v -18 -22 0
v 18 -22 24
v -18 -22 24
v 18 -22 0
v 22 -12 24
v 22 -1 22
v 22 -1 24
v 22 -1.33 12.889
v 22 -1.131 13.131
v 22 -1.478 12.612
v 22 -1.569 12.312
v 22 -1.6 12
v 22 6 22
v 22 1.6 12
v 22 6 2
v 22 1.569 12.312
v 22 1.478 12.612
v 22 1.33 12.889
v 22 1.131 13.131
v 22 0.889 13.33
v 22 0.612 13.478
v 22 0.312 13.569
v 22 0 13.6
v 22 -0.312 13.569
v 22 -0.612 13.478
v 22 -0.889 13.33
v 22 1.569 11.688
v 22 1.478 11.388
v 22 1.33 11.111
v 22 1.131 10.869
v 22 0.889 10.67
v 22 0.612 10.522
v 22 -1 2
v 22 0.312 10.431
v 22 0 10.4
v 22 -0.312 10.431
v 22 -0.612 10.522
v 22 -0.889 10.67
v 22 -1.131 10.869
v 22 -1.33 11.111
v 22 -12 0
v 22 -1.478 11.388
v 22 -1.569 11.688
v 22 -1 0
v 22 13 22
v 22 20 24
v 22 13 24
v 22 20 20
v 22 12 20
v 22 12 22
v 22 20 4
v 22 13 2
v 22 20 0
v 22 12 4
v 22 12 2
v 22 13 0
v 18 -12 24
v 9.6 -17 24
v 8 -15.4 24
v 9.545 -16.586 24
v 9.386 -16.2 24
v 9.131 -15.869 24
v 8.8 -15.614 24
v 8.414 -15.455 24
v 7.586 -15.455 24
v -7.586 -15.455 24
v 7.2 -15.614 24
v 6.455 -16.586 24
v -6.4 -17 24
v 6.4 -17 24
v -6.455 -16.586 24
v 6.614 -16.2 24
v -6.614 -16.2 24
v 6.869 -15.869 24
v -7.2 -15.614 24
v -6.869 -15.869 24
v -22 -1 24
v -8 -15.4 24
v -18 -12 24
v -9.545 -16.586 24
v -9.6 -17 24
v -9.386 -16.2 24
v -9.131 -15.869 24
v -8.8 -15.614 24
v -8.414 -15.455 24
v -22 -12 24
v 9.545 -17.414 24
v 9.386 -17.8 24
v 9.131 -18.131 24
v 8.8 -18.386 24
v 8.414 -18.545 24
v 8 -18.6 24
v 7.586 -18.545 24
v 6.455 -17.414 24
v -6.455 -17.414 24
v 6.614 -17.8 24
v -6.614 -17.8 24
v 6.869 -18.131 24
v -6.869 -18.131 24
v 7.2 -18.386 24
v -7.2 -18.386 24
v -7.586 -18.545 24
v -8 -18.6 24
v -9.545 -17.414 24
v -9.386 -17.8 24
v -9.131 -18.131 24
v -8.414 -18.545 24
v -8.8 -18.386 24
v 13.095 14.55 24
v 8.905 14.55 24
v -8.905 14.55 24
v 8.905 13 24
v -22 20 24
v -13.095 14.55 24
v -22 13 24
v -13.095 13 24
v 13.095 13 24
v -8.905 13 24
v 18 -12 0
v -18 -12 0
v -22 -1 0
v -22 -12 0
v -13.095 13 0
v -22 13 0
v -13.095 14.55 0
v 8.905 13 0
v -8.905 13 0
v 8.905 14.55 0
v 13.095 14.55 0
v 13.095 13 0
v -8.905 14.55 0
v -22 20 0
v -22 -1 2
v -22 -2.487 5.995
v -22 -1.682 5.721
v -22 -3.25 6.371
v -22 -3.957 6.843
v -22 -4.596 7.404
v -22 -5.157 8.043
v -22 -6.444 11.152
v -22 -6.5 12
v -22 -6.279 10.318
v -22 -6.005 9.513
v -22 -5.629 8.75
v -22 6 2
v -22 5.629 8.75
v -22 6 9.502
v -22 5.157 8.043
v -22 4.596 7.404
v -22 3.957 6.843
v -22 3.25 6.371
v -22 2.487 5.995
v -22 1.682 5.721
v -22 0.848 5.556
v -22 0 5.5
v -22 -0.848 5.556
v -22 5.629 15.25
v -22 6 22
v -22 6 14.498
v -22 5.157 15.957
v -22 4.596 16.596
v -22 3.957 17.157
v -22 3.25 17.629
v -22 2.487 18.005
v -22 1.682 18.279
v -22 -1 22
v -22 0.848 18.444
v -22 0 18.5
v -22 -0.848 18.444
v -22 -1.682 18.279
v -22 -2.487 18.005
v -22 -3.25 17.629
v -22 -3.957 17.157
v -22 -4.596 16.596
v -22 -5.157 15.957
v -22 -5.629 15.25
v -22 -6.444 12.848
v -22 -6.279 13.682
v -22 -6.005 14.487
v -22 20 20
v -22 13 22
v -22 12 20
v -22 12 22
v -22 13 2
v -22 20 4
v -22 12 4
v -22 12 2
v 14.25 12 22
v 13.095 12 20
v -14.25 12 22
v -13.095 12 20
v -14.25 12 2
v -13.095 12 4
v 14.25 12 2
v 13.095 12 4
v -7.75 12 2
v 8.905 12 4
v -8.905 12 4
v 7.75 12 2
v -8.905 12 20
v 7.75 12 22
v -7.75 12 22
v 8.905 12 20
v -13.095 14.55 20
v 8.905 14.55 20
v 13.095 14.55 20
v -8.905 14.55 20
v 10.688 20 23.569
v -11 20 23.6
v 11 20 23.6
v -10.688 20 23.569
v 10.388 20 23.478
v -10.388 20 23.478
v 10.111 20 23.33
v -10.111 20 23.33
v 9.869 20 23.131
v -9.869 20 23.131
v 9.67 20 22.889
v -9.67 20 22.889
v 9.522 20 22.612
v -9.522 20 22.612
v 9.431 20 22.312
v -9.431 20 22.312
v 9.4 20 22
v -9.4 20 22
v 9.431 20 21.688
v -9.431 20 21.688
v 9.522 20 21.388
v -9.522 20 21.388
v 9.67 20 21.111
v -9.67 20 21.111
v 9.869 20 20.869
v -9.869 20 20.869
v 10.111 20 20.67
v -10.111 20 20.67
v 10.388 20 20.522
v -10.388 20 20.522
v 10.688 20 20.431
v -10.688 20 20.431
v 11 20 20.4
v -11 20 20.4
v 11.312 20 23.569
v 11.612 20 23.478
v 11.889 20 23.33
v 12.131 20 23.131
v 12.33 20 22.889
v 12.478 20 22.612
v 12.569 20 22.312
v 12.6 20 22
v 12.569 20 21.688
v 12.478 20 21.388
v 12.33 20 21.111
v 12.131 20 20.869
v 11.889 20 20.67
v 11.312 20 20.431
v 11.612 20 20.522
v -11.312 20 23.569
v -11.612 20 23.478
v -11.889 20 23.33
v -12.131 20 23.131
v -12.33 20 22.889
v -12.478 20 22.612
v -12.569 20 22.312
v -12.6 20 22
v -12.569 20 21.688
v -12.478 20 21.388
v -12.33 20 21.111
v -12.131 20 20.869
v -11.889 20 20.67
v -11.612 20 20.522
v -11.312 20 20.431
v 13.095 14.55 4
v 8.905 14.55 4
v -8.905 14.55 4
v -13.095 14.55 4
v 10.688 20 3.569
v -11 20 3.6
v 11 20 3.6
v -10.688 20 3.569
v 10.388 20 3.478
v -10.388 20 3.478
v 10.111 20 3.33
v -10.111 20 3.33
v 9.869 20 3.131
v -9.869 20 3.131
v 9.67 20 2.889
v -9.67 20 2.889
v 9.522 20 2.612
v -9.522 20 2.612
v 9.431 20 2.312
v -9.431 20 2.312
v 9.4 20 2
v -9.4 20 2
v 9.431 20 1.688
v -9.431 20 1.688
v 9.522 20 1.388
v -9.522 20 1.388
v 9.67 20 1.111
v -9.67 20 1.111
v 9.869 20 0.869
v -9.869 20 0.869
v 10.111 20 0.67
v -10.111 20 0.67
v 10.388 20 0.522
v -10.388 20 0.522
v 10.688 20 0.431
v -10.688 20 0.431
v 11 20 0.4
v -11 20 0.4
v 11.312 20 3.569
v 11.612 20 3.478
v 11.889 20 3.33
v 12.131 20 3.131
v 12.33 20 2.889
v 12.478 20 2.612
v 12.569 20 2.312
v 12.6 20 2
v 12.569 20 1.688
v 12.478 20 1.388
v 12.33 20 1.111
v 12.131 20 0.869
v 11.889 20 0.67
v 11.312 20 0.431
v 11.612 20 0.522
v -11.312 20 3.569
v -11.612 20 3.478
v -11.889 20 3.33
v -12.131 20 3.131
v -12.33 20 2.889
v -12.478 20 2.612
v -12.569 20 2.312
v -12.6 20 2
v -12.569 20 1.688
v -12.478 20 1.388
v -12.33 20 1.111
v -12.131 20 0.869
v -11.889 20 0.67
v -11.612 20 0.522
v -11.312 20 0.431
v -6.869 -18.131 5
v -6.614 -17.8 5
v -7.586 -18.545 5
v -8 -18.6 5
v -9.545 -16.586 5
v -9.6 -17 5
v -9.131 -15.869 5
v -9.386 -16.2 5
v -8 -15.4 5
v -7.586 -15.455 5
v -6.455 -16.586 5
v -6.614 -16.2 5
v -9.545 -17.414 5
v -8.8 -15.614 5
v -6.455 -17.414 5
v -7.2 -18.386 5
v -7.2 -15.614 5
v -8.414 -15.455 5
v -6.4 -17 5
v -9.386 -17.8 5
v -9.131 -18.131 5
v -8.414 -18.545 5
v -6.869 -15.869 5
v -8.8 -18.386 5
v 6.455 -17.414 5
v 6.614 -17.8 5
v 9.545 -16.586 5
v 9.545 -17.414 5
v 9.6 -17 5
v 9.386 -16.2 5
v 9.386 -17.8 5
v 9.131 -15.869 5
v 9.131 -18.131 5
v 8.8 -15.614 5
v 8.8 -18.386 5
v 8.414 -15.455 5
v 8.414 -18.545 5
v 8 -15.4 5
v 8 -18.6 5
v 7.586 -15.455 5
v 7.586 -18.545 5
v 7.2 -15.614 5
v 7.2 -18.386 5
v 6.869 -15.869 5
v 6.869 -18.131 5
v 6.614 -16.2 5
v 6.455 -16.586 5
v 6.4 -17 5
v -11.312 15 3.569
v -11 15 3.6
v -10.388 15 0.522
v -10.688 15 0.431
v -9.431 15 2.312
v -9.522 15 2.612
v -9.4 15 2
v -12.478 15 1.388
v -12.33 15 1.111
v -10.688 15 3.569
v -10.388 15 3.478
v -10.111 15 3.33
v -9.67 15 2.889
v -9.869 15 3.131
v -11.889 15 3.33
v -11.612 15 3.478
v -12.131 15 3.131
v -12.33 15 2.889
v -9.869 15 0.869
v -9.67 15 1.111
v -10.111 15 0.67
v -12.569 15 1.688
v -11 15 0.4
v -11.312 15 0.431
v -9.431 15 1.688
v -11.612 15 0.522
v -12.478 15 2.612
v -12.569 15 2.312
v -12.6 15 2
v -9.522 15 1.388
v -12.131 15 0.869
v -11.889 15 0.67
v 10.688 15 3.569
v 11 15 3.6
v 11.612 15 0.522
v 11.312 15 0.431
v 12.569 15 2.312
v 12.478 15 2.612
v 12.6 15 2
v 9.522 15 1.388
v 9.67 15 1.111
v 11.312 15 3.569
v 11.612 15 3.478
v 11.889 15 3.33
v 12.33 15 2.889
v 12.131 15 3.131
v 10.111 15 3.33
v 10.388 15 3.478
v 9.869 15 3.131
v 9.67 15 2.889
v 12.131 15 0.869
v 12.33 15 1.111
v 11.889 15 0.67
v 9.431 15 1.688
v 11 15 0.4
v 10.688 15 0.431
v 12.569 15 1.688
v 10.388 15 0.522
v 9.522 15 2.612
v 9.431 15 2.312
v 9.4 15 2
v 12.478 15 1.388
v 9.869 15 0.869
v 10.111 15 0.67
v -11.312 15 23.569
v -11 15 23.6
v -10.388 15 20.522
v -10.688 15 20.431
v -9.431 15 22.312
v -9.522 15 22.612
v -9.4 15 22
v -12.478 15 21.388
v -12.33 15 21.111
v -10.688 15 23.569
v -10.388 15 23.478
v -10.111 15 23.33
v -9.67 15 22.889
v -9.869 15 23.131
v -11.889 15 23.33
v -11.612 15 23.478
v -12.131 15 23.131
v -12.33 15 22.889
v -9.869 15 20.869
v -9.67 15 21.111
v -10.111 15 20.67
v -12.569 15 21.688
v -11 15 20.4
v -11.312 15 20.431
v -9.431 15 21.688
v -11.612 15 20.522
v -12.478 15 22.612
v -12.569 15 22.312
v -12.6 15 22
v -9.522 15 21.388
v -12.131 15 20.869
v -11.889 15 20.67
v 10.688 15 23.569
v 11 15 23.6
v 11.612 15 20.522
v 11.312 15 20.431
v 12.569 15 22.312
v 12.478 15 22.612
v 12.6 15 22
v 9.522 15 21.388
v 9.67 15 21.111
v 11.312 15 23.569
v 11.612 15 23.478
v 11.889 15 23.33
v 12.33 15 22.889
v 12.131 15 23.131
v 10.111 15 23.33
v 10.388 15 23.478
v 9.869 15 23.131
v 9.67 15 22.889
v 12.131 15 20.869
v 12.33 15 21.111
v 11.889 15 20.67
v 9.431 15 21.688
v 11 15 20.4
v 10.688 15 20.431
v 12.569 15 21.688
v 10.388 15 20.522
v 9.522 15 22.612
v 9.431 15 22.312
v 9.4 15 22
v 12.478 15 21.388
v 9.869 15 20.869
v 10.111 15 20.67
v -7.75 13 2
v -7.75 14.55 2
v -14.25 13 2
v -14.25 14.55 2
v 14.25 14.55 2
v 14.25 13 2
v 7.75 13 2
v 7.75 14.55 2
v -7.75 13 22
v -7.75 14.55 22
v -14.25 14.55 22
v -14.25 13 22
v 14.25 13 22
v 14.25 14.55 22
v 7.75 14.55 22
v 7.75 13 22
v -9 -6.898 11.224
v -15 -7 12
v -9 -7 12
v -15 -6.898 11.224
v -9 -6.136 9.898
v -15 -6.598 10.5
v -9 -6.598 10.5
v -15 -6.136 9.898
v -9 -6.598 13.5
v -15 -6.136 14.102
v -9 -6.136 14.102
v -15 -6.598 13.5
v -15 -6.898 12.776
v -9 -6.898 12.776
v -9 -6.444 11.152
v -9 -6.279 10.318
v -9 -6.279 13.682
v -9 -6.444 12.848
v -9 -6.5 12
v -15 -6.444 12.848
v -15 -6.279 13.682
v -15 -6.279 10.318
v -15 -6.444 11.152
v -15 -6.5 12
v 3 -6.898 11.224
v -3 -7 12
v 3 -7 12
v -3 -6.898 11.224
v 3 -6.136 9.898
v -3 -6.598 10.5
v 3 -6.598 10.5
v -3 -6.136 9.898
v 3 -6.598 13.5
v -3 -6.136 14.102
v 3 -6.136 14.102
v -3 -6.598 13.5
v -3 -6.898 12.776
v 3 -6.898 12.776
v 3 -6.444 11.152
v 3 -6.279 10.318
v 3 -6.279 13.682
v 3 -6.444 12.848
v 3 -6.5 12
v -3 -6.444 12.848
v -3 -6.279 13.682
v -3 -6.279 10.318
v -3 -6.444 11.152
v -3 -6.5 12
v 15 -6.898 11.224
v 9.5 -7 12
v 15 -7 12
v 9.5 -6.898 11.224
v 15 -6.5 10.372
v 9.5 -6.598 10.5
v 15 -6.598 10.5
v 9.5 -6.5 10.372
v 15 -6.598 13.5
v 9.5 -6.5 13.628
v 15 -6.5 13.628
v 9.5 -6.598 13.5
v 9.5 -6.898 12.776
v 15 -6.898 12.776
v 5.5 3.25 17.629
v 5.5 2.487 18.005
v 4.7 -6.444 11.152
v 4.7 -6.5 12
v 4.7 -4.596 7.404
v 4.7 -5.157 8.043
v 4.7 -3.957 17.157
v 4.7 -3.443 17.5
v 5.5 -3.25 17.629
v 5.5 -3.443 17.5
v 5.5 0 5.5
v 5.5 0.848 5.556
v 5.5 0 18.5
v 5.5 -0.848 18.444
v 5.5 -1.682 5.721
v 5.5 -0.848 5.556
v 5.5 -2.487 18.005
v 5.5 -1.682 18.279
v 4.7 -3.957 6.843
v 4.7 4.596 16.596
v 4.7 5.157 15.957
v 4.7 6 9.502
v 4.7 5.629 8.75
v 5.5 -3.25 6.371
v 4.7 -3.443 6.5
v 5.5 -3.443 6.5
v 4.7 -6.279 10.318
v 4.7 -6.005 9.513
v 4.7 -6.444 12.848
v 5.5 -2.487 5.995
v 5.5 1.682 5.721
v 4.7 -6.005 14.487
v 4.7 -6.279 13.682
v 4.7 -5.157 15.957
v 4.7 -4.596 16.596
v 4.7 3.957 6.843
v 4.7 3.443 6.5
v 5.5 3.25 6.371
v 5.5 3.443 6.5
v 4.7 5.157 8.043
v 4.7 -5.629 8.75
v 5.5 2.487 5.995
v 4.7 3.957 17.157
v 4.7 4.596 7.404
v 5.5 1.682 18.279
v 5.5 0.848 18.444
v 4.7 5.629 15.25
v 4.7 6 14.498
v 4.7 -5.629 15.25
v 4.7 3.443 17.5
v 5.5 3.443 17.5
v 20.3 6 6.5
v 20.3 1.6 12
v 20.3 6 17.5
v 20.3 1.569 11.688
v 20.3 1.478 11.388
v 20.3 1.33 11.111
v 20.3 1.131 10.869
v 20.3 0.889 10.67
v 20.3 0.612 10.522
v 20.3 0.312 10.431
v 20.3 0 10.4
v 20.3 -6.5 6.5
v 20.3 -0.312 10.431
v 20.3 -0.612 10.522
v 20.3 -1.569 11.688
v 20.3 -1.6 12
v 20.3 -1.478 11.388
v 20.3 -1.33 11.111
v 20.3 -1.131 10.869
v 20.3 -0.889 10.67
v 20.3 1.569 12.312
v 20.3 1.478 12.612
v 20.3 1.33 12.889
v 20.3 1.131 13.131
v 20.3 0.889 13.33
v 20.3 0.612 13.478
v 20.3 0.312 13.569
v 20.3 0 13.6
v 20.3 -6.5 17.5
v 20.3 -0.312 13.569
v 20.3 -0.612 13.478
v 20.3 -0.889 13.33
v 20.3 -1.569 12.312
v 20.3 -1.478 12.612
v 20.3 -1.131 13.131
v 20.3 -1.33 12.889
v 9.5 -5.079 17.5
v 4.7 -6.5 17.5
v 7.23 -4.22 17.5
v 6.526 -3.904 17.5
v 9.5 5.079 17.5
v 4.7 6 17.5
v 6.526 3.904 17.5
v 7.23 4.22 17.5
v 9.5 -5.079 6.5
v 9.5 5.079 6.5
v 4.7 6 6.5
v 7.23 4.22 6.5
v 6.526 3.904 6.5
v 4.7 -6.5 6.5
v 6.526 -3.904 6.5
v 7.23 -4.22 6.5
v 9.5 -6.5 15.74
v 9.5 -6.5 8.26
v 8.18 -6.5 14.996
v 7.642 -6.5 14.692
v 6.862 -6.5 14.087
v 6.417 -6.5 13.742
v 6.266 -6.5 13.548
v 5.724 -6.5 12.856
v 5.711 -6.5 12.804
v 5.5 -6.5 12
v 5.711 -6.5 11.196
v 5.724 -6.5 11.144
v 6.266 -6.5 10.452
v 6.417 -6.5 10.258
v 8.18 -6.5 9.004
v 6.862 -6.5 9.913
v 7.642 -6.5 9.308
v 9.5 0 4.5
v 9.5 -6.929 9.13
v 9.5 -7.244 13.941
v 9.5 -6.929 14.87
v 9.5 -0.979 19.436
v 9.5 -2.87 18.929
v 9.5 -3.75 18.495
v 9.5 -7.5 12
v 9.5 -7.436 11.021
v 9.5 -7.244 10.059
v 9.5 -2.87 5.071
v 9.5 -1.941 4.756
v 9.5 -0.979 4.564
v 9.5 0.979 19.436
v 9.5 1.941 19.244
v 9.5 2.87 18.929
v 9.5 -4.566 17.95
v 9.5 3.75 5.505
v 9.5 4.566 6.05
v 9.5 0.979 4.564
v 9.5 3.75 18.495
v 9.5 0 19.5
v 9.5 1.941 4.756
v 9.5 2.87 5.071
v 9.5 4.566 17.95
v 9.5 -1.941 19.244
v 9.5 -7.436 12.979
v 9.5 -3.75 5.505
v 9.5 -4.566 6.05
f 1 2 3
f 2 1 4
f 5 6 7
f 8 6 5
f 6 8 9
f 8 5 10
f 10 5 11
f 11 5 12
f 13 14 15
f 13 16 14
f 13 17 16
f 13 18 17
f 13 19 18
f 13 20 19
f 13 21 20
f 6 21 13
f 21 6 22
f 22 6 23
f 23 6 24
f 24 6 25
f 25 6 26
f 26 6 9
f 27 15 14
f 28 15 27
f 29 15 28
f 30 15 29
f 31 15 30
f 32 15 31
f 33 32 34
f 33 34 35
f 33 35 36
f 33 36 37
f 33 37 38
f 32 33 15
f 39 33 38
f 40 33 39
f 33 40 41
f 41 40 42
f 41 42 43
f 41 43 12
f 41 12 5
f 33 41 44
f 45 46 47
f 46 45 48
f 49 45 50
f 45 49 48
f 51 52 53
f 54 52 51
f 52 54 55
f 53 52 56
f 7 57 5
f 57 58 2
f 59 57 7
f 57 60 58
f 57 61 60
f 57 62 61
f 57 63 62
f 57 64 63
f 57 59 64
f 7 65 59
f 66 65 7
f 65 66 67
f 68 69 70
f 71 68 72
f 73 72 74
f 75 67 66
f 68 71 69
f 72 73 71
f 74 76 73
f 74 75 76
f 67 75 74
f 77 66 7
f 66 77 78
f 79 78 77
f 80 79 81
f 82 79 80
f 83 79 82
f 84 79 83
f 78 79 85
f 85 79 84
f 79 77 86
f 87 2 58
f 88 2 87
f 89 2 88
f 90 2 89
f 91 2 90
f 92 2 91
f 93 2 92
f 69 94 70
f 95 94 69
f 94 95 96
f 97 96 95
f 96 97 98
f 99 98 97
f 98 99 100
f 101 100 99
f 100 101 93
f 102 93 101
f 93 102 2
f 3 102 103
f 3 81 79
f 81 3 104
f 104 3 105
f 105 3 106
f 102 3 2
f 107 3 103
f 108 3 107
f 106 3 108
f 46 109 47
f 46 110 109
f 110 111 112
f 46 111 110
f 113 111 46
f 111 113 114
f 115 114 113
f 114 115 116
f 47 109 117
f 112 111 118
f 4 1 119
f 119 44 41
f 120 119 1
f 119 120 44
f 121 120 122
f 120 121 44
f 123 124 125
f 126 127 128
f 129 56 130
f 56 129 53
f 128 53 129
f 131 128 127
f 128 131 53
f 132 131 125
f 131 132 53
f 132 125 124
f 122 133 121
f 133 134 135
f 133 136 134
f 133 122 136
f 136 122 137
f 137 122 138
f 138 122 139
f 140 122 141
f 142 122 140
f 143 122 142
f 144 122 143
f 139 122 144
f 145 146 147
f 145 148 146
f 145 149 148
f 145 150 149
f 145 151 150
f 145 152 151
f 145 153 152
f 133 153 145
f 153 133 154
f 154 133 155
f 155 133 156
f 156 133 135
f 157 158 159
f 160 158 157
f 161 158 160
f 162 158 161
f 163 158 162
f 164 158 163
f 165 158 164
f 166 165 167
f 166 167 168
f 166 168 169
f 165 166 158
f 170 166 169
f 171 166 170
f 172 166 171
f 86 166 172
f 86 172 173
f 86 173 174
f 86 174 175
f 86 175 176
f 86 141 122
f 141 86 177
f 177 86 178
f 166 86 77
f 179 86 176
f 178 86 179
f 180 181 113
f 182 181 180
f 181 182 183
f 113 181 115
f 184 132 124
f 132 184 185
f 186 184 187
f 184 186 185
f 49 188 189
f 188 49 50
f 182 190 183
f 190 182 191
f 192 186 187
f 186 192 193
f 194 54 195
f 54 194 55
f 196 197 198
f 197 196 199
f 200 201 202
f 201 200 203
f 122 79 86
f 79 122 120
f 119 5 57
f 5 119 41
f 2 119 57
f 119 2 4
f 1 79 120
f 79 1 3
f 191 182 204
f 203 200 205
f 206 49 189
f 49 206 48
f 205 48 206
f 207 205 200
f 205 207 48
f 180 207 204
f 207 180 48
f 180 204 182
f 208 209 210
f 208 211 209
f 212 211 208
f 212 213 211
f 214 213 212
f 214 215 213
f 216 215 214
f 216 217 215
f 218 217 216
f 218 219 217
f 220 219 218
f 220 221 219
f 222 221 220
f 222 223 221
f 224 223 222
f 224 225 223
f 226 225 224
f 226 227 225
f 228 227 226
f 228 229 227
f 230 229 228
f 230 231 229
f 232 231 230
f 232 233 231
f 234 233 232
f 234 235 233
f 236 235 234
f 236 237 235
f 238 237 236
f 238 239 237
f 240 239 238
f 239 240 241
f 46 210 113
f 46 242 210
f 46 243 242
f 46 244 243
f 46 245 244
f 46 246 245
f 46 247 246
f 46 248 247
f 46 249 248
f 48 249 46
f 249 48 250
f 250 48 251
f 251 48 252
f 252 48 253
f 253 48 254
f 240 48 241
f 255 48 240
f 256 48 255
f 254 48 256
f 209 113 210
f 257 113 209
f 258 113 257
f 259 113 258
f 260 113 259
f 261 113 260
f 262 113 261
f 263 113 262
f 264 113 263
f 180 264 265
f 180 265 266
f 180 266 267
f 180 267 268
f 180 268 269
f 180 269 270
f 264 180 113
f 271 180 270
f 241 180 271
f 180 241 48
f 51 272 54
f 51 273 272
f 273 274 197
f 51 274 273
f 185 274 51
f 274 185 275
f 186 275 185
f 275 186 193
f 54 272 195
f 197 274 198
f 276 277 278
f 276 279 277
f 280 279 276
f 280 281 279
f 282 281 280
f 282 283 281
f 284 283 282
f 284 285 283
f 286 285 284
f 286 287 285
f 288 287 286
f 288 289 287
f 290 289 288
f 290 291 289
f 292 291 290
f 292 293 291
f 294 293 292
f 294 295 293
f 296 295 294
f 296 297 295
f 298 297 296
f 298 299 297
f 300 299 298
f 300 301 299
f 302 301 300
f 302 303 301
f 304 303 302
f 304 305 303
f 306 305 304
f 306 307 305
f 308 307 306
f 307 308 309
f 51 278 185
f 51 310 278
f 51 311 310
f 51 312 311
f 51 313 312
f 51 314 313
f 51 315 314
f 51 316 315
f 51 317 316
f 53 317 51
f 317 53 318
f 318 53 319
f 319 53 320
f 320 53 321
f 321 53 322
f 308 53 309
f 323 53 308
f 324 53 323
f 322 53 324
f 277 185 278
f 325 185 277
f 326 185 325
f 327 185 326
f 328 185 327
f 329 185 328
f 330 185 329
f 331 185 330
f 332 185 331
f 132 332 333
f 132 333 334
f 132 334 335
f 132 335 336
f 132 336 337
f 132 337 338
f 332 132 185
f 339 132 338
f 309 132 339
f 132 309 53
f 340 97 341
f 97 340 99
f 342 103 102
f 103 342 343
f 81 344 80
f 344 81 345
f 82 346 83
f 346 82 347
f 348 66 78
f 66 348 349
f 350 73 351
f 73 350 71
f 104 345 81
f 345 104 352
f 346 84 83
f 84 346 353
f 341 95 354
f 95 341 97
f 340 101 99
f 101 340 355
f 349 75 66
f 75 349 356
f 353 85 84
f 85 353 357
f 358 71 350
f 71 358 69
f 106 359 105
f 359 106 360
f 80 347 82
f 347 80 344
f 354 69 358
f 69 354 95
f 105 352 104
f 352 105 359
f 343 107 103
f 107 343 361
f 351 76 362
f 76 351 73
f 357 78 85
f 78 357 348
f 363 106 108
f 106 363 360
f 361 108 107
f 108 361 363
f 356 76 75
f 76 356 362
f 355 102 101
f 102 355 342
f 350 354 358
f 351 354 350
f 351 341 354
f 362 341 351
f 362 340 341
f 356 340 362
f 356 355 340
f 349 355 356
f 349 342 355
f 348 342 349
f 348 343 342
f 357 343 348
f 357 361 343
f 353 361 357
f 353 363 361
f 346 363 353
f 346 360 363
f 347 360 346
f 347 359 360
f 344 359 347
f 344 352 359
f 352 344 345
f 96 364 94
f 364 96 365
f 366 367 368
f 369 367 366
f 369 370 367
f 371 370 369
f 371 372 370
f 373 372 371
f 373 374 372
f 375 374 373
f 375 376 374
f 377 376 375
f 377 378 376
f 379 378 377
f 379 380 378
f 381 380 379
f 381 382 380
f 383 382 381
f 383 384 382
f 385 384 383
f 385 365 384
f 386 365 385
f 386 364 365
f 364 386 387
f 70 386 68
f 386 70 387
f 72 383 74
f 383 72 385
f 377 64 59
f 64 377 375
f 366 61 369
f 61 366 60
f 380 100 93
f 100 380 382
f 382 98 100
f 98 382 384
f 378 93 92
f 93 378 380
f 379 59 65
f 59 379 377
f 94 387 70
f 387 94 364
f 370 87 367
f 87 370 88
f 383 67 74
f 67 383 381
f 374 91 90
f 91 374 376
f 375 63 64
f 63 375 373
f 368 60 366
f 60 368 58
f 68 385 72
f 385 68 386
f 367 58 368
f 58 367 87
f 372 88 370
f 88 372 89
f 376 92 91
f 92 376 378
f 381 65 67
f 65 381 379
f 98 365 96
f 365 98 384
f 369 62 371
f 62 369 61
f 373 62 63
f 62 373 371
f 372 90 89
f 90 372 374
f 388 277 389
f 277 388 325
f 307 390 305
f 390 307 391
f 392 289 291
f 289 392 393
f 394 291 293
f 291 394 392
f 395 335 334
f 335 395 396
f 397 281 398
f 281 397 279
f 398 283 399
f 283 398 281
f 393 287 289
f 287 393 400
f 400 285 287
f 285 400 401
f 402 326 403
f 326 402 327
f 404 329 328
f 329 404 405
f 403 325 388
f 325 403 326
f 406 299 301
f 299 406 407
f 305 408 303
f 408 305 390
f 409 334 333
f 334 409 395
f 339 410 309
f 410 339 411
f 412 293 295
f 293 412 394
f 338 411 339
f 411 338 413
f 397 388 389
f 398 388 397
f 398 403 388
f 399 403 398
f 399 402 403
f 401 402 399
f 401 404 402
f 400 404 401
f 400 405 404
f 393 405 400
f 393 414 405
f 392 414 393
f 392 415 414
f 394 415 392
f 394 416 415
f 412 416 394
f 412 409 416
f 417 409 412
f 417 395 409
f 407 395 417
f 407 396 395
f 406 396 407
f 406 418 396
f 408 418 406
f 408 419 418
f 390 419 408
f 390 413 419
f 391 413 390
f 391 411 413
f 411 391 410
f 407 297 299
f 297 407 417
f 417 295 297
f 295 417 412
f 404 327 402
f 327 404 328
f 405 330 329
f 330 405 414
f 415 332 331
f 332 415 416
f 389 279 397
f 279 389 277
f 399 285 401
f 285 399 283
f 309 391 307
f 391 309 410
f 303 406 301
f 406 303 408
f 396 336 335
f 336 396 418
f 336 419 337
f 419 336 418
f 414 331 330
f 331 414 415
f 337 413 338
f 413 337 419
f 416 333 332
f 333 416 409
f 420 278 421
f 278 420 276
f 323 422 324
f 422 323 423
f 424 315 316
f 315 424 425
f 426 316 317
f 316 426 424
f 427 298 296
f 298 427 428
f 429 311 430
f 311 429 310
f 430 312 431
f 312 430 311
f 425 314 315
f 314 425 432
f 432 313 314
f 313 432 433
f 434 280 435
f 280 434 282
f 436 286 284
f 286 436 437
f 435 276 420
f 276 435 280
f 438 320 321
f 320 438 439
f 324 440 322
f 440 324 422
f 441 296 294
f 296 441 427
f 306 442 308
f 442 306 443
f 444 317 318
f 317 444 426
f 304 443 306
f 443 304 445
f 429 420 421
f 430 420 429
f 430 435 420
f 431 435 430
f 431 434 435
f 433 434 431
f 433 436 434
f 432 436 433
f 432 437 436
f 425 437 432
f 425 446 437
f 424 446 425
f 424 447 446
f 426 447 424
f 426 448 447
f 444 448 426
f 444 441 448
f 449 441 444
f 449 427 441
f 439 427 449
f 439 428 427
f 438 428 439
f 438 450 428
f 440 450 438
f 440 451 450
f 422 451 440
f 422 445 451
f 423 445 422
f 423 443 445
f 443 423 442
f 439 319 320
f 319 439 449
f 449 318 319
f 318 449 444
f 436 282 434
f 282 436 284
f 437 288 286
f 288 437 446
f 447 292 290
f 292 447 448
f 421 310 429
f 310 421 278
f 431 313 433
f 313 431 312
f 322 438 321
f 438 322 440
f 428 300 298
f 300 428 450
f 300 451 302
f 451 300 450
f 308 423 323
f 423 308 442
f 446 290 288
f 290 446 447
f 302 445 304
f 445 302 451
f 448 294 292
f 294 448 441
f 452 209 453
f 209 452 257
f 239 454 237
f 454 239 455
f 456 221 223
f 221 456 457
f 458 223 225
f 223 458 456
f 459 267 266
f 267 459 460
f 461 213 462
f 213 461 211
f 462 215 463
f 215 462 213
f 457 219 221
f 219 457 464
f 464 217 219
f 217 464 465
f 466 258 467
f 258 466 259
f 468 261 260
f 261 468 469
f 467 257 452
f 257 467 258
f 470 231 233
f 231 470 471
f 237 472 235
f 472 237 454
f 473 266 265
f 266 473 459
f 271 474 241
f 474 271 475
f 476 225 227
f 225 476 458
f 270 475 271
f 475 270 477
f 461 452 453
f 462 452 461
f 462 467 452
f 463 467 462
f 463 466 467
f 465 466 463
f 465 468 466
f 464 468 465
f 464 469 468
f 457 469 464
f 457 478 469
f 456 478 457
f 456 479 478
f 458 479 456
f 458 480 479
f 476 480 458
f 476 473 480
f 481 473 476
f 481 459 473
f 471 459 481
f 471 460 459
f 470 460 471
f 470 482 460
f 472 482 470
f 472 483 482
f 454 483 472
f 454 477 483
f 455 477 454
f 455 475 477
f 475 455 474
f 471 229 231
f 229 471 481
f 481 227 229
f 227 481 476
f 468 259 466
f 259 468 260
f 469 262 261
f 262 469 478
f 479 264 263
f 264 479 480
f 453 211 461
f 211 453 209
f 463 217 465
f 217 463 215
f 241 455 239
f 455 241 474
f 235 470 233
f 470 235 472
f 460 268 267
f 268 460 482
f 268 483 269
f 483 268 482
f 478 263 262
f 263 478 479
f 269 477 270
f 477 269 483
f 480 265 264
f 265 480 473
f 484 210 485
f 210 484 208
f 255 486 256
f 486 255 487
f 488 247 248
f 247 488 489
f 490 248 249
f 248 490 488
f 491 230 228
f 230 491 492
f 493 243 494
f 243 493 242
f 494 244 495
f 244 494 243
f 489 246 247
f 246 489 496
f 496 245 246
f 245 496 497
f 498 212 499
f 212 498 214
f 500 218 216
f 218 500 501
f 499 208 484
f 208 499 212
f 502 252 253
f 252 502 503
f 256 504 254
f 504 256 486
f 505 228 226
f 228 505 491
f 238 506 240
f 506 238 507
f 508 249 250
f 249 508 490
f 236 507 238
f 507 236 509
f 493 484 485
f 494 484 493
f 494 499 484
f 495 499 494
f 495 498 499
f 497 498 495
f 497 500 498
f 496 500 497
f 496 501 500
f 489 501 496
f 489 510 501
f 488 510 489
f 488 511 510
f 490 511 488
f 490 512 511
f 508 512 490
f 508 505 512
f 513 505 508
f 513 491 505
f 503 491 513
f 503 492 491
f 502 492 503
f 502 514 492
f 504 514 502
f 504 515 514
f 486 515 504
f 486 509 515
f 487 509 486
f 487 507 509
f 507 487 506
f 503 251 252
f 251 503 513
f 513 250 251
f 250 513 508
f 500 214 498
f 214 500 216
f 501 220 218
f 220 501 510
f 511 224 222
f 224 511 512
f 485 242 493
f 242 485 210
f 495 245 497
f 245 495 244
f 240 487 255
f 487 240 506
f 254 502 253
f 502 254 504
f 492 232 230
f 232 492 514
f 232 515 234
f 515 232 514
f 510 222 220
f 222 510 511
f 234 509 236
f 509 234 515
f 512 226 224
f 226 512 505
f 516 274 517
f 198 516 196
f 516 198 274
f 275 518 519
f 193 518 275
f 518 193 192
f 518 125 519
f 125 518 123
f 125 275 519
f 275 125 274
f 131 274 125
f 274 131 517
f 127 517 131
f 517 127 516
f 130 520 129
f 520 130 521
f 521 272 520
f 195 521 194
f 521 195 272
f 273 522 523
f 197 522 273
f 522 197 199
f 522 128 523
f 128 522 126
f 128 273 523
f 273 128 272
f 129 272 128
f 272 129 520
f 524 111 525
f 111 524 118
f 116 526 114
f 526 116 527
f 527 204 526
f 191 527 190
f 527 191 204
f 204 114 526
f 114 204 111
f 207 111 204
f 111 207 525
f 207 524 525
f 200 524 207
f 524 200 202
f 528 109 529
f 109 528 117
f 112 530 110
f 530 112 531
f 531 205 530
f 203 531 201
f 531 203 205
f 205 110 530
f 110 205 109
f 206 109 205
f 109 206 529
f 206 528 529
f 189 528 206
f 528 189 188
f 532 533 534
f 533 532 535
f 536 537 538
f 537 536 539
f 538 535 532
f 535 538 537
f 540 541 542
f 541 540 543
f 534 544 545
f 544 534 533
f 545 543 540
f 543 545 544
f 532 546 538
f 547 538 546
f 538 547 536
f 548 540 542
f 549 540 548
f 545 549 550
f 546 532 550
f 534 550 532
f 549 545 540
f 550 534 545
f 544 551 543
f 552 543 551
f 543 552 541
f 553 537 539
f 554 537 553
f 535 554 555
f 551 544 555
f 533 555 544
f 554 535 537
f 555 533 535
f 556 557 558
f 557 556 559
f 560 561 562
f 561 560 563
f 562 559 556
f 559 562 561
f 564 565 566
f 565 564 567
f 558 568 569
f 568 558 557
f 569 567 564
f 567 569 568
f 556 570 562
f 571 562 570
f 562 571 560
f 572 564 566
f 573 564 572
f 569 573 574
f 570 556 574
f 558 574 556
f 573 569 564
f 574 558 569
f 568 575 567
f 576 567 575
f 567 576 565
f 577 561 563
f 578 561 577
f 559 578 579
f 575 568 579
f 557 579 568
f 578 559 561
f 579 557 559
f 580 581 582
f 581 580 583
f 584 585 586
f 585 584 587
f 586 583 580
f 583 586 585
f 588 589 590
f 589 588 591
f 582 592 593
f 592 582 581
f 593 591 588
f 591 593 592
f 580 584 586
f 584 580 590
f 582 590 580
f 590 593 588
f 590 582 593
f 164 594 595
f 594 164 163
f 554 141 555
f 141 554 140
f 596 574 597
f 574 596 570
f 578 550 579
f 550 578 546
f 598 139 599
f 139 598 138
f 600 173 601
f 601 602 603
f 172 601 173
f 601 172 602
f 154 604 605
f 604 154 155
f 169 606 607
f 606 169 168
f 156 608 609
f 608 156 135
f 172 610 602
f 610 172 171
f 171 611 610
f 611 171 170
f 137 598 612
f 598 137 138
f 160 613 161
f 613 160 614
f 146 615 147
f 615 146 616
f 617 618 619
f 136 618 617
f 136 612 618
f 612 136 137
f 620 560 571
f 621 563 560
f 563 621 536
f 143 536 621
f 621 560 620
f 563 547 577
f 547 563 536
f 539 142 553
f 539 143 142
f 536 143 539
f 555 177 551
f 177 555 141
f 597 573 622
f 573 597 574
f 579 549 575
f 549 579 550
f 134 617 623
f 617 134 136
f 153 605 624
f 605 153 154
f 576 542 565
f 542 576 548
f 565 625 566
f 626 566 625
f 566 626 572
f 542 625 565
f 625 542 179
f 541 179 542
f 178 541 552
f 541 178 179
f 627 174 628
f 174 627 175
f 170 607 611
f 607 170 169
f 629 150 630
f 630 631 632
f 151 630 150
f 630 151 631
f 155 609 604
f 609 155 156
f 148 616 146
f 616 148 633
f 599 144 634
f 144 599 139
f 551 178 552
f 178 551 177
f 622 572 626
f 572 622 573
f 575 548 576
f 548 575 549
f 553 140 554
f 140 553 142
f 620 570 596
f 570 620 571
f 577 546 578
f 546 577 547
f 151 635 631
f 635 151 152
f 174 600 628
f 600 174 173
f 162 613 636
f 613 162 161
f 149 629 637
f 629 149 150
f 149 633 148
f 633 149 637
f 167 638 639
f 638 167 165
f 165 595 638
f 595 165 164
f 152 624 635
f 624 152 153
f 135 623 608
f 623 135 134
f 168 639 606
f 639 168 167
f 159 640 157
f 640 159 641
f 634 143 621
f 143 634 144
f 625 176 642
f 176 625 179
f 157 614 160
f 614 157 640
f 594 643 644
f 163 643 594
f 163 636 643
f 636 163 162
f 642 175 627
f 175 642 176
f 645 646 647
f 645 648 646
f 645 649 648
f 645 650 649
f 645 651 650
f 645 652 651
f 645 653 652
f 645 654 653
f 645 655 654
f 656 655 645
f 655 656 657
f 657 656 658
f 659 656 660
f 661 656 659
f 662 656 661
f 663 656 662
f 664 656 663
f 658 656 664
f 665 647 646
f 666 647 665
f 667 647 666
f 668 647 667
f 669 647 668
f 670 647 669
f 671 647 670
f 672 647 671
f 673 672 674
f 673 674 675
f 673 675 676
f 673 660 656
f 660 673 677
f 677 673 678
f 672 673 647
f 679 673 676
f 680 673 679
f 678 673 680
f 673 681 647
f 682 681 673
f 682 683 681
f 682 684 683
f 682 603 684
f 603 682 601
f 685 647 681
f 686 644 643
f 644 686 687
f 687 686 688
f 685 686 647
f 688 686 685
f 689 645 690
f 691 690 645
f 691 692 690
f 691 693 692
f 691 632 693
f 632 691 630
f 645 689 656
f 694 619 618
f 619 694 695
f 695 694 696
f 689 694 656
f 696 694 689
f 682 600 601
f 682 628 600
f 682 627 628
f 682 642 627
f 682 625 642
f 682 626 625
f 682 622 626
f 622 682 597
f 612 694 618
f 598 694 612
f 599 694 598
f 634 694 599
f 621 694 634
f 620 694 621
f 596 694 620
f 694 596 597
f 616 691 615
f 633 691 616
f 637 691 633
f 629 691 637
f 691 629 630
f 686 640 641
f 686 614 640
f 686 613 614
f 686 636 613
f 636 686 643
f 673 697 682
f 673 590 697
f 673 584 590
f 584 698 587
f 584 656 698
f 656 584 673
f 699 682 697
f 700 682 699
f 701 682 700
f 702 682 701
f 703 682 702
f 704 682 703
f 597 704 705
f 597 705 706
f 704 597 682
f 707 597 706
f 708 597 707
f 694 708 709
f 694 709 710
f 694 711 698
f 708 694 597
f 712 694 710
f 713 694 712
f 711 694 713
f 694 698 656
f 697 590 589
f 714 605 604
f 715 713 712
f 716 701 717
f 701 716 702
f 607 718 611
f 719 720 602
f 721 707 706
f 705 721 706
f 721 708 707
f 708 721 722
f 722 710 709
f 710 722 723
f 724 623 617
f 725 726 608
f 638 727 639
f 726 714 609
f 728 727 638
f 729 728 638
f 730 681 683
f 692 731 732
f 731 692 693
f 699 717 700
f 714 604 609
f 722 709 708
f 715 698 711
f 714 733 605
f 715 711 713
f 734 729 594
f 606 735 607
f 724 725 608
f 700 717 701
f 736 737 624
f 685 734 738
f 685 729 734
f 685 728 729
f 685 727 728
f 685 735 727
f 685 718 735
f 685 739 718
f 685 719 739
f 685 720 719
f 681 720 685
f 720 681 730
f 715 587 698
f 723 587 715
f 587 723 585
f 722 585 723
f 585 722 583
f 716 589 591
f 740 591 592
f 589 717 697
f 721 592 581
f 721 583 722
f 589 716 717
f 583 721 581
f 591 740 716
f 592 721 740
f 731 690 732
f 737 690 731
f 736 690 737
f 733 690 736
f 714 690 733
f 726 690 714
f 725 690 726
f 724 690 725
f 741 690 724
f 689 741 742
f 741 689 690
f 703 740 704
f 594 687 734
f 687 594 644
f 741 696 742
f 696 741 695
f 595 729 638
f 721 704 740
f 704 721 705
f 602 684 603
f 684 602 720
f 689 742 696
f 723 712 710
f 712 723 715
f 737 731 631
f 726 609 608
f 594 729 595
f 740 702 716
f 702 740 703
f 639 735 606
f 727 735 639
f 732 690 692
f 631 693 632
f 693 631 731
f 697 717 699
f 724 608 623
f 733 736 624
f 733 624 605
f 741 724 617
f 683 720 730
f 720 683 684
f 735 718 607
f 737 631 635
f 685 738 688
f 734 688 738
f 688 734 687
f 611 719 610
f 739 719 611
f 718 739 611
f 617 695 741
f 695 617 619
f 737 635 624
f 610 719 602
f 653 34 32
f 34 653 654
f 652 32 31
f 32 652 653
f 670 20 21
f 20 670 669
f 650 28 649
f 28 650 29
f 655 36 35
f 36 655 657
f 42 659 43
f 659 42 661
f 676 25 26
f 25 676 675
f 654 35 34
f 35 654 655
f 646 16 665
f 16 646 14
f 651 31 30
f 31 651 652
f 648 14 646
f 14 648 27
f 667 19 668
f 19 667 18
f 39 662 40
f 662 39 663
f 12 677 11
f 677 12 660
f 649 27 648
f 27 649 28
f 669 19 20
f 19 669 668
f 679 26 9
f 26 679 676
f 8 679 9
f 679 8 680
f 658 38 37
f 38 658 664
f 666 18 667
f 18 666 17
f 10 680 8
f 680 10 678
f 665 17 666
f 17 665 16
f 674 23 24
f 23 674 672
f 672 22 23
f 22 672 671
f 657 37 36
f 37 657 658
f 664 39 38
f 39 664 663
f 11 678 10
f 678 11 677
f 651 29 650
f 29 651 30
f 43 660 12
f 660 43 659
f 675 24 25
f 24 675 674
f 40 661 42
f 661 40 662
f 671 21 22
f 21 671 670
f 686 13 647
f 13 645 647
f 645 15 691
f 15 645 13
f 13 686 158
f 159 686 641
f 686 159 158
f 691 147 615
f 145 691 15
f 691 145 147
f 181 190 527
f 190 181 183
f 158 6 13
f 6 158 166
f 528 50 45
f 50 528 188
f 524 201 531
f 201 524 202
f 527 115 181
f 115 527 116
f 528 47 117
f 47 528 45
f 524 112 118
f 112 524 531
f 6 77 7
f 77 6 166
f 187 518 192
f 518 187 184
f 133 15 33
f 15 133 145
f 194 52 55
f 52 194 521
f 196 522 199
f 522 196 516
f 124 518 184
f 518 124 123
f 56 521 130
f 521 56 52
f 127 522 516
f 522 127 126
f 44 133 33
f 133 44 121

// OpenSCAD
// ============================================================
// 05_电机座.scad — N20电机可调夹具 v4
// ============================================================
// v4 修订：
//   - 两段式内孔：后段Ø13mm(电机圆柱体) + 前段13×11mm(减速箱矩形腔)
//   - 开口槽从内孔边缘直通外壁 (真正能夹紧)
//   - 法兰长孔Z=[4,18], 匹配底盘凸台孔Z=5,15
//   - 数量×2 (第二个镜像)
// ============================================================

/* [全局参数] */
// N20电机尺寸
motor_dia       = 12;    // 电机后段直径
motor_len       = 25;    // 电机后段长度
gearbox_w       = 12;    // 减速箱截面宽
gearbox_h       = 10;    // 减速箱截面高
gearbox_len     = 15;    // 减速箱段长度
motor_total     = 40;    // 总长
shaft_dia       = 3.2;   // 输出轴径
shaft_len       = 12;    // 轴露出长度

// 夹具主体
clamp_len       = 44;    // 夹具总长
body_w          = 24;    // 宽
body_h          = 24;    // 高

// 法兰 (接底盘凸台)
flange_len      = 36;    // 法兰前后长
flange_w        = 10;    // 法兰宽
flange_thick    = 3;     // 法兰厚 (实际是Y方向深度)
flange_hole_h   = 16;    // 前后孔距 (±8)
flange_slot_z0  = 4;     // 长孔起点Z
flange_slot_h   = 14;    // 长孔长度 (终点Z=18)
flange_slot_w   = 3.2;   // 槽宽=M3

// 锁紧结构
clamp_screw_dia = 3.2;
clamp_ear_w     = 8;     // 耳朵宽
clamp_ear_thick = 4;     // 耳朵厚

m3_dia = 3.2;
nut_d  = 6.5;            // M3螺母对边
nut_h  = 2.8;

// ============================================================
module motor_mount() {
    difference() {
        union() {
            // 主体 (含前后壁)
            translate([0, 0, body_h/2])
            cube([clamp_len, body_w, body_h], center = true);

            // 安装法兰 (从侧面伸出, 接底盘凸台)
            translate([0, -body_w/2 - flange_w/2, body_h/2])
            cube([flange_len, flange_w, body_h], center = true);

            // 夹紧耳朵 (上下各一对, 在夹缝两侧)
            // 上耳
            translate([0, body_w/2 + clamp_ear_w/2, body_h - clamp_ear_thick/2])
            cube([clamp_len, clamp_ear_w, clamp_ear_thick], center = true);
            // 下耳
            translate([0, body_w/2 + clamp_ear_w/2, clamp_ear_thick/2])
            cube([clamp_len, clamp_ear_w, clamp_ear_thick], center = true);

            // 法兰加强三角
            for (fx = [-flange_len/3, 0, flange_len/3])
                translate([fx, -body_w/2, body_h/2])
                rotate([90, 0, 0])
                linear_extrude(height = flange_w)
                polygon([[0,0], [4,0], [0,4]]);
        }

        // ===== 两段式内孔 =====
        // 后段: 电机圆柱体 Ø13mm (留1mm间隙)
        translate([-(gearbox_len)/2, 0, body_h/2])
        rotate([0, 90, 0])
        cylinder(d = motor_dia + 1, h = motor_len + 4,
                 center = true, $fn = 48);

        // 前段: 减速箱矩形腔 13×11mm
        translate([clamp_len/2 - 2 - gearbox_len/2, 0, body_h/2])
        cube([gearbox_len + 0.6, gearbox_w + 1, gearbox_h + 1], center = true);

        // 两段之间的过渡锥
        translate([gearbox_len/2, 0, body_h/2])
        rotate([0, 90, 0])
        cylinder(d1 = motor_dia + 1, d2 = max(gearbox_w, gearbox_h) + 3,
                 h = 4, center = true, $fn = 48);

        // 输出轴孔
        translate([clamp_len/2 - 1, 0, body_h/2])
        rotate([0, 90, 0])
        cylinder(d = shaft_dia, h = shaft_len + 4, center = true, $fn = 32);

        // ===== 开口槽 (从内孔直通外壁, 让夹具能弹性变形) =====
        // 缝宽2mm, 从内孔到外壁
        slit_start_y = motor_dia/2;           // 孔边缘 Y≈6
        slit_end_y   = body_w/2;              // 外壁 Y=12
        slit_center_y = (slit_start_y + slit_end_y) / 2;
        slit_width_y  = slit_end_y - slit_start_y;

        translate([0, slit_center_y, body_h/2])
        cube([clamp_len + 2, slit_width_y, body_h + 2], center = true);

        // 上下水平释放槽 (让夹缝更灵活)
        translate([0, body_w/4, body_h - 1])
        cube([clamp_len + 2, body_w/2 + 2, 2], center = true);
        translate([0, body_w/4, 1])
        cube([clamp_len + 2, body_w/2 + 2, 2], center = true);

        // ===== 法兰竖向长孔 (×4) =====
        for (fx = [-flange_hole_h/2, flange_hole_h/2])
            translate([fx, -body_w/2 - flange_w/2,
                       flange_slot_z0 + flange_slot_h/2])
            hull() {
                cylinder(d = flange_slot_w, h = flange_w + 2,
                         center = true, $fn = 24);
                translate([0, 0, flange_slot_h - flange_slot_w])
                cylinder(d = flange_slot_w, h = flange_w + 2,
                         center = true, $fn = 24);
            }

        // ===== 夹紧螺丝孔 (从耳朵外侧穿入) =====
        for (fz = [clamp_ear_thick/2, body_h - clamp_ear_thick/2])
            for (fx = [-clamp_len/4, clamp_len/4])
                translate([fx, body_w/2 + clamp_ear_w, fz])
                rotate([90, 0, 0])
                cylinder(d = clamp_screw_dia, h = clamp_ear_w + 2,
                         center = true, $fn = 32);

        // ===== 螺母陷阱 (耳朵内侧) =====
        for (fz = [clamp_ear_thick/2, body_h - clamp_ear_thick/2])
            for (fx = [-clamp_len/4, clamp_len/4])
                translate([fx, body_w/2 + clamp_ear_w - clamp_ear_w + 1, fz])
                rotate([90, 0, 0])
                cylinder(d = nut_d, h = nut_h + 0.3, center = true, $fn = 6);

        // ===== 减重/散热孔 =====
        for (fx = [-12, 0, 12])
            translate([fx, -4, body_h/2])
            rotate([0, 90, 0])
            cylinder(d = 6, h = 6, center = true, $fn = 24);
    }
}

motor_mount();

// ============================================================
// 使用说明:
// 1. 打印×2 (第二个镜像)
// 2. N20电机从后端塞入: 电机体进Ø13段, 减速箱进矩形腔
// 3. M3×20螺丝穿过上下耳朵→螺母陷阱→逐步拧紧夹住电机
// 4. M3×14螺丝穿过法兰长孔→底盘凸台孔→加螺母锁死
// 5. Z轴可调: 长孔范围4~18mm, 底盘孔在5和15mm, 有足够余量
//
// 打印: 层高0.2, 填充25%, 法兰朝下平放, ~50min
// ============================================================
